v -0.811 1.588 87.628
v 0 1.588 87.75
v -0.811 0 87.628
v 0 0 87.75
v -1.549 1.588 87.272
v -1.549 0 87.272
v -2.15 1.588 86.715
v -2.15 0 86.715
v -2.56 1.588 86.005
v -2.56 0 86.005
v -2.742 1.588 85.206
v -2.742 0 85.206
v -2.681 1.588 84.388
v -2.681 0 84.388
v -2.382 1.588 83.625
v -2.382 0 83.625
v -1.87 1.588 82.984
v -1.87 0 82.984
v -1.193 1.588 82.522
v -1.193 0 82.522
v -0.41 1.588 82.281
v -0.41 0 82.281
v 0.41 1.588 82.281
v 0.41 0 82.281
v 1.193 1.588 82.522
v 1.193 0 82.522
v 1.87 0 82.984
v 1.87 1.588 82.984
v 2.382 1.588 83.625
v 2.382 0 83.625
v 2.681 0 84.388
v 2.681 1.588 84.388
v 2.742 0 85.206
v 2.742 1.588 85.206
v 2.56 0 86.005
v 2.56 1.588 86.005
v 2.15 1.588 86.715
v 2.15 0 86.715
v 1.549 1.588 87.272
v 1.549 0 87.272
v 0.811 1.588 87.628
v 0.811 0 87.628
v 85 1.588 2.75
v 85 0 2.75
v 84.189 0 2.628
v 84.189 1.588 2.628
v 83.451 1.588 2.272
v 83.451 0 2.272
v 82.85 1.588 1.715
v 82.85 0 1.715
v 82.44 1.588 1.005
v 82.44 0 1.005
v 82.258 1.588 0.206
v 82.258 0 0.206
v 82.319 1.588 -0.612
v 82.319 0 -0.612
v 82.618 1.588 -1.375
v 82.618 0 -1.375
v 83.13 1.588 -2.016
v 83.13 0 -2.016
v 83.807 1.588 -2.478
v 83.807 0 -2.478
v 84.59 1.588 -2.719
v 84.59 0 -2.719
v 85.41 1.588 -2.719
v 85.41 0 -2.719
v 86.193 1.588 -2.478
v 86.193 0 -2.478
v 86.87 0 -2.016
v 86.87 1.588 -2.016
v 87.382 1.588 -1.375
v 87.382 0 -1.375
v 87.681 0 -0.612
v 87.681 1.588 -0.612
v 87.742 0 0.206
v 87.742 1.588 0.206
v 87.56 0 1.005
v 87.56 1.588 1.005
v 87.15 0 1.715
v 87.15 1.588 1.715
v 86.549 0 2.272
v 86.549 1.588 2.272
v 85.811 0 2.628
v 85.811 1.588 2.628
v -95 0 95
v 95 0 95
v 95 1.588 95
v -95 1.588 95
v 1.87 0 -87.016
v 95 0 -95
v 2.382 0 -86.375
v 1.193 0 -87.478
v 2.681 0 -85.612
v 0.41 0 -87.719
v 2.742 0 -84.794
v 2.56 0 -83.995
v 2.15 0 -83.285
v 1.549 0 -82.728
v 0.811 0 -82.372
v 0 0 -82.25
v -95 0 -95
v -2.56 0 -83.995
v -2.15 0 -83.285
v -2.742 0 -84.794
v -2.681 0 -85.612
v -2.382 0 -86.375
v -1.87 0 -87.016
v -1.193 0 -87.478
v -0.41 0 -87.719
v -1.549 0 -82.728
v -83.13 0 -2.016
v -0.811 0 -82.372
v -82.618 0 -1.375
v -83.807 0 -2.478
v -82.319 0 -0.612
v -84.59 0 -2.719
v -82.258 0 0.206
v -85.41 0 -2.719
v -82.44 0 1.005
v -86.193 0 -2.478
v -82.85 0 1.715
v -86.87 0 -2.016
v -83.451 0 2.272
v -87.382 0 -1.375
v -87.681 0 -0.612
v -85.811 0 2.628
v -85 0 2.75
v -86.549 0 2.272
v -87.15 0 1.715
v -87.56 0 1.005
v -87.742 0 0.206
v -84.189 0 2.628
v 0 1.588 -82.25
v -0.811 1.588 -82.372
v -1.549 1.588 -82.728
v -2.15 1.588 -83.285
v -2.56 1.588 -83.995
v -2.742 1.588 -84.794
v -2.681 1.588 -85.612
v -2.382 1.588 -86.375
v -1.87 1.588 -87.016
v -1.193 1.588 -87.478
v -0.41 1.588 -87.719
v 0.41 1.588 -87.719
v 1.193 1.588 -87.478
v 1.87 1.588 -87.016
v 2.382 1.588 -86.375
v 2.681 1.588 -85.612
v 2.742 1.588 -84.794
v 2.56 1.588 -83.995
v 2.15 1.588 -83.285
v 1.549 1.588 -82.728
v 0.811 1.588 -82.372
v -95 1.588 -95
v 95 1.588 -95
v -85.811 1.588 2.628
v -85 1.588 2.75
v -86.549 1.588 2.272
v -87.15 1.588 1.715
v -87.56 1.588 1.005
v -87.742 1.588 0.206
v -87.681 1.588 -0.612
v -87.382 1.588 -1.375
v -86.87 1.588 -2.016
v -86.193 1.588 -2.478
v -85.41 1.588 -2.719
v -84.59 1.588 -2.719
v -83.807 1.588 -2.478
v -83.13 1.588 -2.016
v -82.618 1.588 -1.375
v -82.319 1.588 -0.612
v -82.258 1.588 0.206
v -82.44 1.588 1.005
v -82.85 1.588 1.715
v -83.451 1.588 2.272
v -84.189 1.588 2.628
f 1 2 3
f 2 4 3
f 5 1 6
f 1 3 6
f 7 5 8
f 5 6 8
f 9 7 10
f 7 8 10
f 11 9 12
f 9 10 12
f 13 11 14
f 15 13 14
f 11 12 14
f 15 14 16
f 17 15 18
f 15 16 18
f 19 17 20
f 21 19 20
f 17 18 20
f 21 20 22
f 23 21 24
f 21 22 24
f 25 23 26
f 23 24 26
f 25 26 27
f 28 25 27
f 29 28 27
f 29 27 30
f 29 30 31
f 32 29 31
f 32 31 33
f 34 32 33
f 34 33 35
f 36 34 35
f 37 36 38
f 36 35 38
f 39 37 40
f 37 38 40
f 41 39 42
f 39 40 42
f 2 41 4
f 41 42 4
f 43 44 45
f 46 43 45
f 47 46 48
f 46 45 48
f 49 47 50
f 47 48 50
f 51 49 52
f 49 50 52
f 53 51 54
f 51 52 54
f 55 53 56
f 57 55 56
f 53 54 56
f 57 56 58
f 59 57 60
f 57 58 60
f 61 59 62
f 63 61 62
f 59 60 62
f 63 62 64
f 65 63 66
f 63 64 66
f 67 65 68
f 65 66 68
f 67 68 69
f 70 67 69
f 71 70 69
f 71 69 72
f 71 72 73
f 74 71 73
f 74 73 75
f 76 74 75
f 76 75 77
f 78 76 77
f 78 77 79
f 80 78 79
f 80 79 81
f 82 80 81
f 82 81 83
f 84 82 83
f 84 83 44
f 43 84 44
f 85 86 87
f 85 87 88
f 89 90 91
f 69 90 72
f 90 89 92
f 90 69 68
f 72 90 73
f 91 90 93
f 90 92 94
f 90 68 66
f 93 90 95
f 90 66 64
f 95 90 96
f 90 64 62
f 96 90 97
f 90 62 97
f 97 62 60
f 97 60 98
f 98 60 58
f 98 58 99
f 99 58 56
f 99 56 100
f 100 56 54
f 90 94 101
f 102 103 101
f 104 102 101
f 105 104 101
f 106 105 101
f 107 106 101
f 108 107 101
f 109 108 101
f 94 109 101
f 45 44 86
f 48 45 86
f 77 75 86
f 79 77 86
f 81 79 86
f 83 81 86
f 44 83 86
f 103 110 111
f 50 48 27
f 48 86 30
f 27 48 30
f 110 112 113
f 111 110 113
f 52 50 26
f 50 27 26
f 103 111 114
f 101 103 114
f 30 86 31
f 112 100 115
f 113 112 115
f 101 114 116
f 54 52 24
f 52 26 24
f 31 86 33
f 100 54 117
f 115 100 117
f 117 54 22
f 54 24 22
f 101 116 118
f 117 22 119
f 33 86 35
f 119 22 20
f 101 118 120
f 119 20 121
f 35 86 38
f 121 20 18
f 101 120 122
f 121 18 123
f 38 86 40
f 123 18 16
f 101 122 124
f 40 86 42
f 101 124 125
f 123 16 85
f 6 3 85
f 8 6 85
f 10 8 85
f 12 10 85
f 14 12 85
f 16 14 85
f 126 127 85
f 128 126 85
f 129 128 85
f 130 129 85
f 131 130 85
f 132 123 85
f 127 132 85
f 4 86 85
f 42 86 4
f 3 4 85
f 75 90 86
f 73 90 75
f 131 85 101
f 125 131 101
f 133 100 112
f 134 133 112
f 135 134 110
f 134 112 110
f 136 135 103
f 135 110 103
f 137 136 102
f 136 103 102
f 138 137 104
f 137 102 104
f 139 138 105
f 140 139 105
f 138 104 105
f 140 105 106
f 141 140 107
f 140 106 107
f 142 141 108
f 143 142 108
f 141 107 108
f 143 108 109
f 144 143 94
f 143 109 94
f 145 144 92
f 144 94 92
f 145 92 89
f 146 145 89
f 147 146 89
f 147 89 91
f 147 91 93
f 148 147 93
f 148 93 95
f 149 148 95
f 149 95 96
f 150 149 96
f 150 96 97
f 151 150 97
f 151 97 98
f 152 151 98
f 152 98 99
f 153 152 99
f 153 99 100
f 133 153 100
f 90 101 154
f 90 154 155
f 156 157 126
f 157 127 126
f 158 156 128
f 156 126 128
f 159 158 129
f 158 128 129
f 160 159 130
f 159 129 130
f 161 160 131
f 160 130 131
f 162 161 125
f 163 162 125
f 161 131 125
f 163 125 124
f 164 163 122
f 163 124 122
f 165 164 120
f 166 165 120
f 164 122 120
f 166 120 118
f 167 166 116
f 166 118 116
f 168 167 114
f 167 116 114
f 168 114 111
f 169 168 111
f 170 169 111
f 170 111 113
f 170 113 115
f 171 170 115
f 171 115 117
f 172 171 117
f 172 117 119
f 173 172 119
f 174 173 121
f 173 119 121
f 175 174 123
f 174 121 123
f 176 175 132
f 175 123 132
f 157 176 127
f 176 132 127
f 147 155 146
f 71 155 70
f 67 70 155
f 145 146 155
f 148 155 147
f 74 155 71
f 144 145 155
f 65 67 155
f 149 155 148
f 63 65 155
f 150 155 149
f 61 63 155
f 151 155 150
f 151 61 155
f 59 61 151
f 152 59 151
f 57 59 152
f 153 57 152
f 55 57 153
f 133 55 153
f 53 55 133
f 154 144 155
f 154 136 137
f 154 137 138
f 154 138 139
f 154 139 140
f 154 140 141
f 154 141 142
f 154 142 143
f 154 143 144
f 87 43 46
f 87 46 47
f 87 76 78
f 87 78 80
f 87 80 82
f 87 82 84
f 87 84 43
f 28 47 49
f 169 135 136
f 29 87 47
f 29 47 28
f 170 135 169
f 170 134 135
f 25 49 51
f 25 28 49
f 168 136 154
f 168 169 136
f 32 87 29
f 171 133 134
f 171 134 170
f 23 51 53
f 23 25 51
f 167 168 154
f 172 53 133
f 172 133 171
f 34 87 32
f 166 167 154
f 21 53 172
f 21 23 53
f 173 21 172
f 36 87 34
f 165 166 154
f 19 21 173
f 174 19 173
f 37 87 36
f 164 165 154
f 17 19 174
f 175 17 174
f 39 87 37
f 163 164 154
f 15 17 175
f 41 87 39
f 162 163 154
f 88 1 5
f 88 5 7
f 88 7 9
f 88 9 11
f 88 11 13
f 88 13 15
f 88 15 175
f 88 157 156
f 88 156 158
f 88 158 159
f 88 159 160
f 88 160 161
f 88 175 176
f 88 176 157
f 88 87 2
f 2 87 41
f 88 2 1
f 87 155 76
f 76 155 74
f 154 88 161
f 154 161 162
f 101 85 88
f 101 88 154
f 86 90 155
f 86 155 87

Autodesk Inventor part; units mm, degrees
ref_plane "YZ Plane" through (0, 0, 0) normal (1, 0, 0) x (0, 1, 0)
ref_plane "XZ Plane" through (0, 0, 0) normal (0, 1, 0) x (-1, 0, 0)
ref_plane "XY Plane" through (0, 0, 0) normal (0, 0, 1) x (1, 0, 0)
sketch "Sketch1" plane through (0, 0, 0) normal (0, 1, 0) x (-1, 0, 0)
  line L0 (95, -95) -> (-95, -95)
  line L1 (-95, -95) -> (-95, 95)
  line L2 (-95, 95) -> (95, 95)
  line L3 (95, 95) -> (95, -95)
  line L4 (95, -95) -> (-95, 95) construction
  line L5 (-95, -95) -> (95, 95) construction
  point P0 (0, 0)
  dimension "d0" = 190
extrude "Extrusion1" add sketch "Sketch1" along normal blind 1.5875
sketch "Sketch2" plane through (0, 1.5875, 0) normal (0, 1, 0) x (1, 0, 0)
  line L0 (-95, 95) -> (-95, -95) projected
  line L1 (-95, -95) -> (95, -95) projected
  line L2 (95, 95) -> (-95, 95) projected
  line L3 (-95, 95) -> (-95, -95) projected
  line L4 (-95, -95) -> (95, -95) projected
  line L5 (95, -95) -> (95, 95) projected
  point P0 (-85, 0)
  point P1 (0, -85)
  point P2 (85, 0)
  point P3 (0, 85)
  point P4 (0, 0)
  dimension "d17" = 10
  dimension "d18" = 10
  dimension "d19" = 10
  dimension "d20" = 10
hole "Hole1" at (-85, 1.5875, 0) at (0, 1.5875, 85) at (85, 1.5875, 0) at (0, 1.5875, -85) direction (0, -1, 0) diameter 5.5 end through all clearance for "Flat Head Machine Screw" size "M5" standard "Ansi Metric M Profile"
properties part number "short covering" material "Glass"
